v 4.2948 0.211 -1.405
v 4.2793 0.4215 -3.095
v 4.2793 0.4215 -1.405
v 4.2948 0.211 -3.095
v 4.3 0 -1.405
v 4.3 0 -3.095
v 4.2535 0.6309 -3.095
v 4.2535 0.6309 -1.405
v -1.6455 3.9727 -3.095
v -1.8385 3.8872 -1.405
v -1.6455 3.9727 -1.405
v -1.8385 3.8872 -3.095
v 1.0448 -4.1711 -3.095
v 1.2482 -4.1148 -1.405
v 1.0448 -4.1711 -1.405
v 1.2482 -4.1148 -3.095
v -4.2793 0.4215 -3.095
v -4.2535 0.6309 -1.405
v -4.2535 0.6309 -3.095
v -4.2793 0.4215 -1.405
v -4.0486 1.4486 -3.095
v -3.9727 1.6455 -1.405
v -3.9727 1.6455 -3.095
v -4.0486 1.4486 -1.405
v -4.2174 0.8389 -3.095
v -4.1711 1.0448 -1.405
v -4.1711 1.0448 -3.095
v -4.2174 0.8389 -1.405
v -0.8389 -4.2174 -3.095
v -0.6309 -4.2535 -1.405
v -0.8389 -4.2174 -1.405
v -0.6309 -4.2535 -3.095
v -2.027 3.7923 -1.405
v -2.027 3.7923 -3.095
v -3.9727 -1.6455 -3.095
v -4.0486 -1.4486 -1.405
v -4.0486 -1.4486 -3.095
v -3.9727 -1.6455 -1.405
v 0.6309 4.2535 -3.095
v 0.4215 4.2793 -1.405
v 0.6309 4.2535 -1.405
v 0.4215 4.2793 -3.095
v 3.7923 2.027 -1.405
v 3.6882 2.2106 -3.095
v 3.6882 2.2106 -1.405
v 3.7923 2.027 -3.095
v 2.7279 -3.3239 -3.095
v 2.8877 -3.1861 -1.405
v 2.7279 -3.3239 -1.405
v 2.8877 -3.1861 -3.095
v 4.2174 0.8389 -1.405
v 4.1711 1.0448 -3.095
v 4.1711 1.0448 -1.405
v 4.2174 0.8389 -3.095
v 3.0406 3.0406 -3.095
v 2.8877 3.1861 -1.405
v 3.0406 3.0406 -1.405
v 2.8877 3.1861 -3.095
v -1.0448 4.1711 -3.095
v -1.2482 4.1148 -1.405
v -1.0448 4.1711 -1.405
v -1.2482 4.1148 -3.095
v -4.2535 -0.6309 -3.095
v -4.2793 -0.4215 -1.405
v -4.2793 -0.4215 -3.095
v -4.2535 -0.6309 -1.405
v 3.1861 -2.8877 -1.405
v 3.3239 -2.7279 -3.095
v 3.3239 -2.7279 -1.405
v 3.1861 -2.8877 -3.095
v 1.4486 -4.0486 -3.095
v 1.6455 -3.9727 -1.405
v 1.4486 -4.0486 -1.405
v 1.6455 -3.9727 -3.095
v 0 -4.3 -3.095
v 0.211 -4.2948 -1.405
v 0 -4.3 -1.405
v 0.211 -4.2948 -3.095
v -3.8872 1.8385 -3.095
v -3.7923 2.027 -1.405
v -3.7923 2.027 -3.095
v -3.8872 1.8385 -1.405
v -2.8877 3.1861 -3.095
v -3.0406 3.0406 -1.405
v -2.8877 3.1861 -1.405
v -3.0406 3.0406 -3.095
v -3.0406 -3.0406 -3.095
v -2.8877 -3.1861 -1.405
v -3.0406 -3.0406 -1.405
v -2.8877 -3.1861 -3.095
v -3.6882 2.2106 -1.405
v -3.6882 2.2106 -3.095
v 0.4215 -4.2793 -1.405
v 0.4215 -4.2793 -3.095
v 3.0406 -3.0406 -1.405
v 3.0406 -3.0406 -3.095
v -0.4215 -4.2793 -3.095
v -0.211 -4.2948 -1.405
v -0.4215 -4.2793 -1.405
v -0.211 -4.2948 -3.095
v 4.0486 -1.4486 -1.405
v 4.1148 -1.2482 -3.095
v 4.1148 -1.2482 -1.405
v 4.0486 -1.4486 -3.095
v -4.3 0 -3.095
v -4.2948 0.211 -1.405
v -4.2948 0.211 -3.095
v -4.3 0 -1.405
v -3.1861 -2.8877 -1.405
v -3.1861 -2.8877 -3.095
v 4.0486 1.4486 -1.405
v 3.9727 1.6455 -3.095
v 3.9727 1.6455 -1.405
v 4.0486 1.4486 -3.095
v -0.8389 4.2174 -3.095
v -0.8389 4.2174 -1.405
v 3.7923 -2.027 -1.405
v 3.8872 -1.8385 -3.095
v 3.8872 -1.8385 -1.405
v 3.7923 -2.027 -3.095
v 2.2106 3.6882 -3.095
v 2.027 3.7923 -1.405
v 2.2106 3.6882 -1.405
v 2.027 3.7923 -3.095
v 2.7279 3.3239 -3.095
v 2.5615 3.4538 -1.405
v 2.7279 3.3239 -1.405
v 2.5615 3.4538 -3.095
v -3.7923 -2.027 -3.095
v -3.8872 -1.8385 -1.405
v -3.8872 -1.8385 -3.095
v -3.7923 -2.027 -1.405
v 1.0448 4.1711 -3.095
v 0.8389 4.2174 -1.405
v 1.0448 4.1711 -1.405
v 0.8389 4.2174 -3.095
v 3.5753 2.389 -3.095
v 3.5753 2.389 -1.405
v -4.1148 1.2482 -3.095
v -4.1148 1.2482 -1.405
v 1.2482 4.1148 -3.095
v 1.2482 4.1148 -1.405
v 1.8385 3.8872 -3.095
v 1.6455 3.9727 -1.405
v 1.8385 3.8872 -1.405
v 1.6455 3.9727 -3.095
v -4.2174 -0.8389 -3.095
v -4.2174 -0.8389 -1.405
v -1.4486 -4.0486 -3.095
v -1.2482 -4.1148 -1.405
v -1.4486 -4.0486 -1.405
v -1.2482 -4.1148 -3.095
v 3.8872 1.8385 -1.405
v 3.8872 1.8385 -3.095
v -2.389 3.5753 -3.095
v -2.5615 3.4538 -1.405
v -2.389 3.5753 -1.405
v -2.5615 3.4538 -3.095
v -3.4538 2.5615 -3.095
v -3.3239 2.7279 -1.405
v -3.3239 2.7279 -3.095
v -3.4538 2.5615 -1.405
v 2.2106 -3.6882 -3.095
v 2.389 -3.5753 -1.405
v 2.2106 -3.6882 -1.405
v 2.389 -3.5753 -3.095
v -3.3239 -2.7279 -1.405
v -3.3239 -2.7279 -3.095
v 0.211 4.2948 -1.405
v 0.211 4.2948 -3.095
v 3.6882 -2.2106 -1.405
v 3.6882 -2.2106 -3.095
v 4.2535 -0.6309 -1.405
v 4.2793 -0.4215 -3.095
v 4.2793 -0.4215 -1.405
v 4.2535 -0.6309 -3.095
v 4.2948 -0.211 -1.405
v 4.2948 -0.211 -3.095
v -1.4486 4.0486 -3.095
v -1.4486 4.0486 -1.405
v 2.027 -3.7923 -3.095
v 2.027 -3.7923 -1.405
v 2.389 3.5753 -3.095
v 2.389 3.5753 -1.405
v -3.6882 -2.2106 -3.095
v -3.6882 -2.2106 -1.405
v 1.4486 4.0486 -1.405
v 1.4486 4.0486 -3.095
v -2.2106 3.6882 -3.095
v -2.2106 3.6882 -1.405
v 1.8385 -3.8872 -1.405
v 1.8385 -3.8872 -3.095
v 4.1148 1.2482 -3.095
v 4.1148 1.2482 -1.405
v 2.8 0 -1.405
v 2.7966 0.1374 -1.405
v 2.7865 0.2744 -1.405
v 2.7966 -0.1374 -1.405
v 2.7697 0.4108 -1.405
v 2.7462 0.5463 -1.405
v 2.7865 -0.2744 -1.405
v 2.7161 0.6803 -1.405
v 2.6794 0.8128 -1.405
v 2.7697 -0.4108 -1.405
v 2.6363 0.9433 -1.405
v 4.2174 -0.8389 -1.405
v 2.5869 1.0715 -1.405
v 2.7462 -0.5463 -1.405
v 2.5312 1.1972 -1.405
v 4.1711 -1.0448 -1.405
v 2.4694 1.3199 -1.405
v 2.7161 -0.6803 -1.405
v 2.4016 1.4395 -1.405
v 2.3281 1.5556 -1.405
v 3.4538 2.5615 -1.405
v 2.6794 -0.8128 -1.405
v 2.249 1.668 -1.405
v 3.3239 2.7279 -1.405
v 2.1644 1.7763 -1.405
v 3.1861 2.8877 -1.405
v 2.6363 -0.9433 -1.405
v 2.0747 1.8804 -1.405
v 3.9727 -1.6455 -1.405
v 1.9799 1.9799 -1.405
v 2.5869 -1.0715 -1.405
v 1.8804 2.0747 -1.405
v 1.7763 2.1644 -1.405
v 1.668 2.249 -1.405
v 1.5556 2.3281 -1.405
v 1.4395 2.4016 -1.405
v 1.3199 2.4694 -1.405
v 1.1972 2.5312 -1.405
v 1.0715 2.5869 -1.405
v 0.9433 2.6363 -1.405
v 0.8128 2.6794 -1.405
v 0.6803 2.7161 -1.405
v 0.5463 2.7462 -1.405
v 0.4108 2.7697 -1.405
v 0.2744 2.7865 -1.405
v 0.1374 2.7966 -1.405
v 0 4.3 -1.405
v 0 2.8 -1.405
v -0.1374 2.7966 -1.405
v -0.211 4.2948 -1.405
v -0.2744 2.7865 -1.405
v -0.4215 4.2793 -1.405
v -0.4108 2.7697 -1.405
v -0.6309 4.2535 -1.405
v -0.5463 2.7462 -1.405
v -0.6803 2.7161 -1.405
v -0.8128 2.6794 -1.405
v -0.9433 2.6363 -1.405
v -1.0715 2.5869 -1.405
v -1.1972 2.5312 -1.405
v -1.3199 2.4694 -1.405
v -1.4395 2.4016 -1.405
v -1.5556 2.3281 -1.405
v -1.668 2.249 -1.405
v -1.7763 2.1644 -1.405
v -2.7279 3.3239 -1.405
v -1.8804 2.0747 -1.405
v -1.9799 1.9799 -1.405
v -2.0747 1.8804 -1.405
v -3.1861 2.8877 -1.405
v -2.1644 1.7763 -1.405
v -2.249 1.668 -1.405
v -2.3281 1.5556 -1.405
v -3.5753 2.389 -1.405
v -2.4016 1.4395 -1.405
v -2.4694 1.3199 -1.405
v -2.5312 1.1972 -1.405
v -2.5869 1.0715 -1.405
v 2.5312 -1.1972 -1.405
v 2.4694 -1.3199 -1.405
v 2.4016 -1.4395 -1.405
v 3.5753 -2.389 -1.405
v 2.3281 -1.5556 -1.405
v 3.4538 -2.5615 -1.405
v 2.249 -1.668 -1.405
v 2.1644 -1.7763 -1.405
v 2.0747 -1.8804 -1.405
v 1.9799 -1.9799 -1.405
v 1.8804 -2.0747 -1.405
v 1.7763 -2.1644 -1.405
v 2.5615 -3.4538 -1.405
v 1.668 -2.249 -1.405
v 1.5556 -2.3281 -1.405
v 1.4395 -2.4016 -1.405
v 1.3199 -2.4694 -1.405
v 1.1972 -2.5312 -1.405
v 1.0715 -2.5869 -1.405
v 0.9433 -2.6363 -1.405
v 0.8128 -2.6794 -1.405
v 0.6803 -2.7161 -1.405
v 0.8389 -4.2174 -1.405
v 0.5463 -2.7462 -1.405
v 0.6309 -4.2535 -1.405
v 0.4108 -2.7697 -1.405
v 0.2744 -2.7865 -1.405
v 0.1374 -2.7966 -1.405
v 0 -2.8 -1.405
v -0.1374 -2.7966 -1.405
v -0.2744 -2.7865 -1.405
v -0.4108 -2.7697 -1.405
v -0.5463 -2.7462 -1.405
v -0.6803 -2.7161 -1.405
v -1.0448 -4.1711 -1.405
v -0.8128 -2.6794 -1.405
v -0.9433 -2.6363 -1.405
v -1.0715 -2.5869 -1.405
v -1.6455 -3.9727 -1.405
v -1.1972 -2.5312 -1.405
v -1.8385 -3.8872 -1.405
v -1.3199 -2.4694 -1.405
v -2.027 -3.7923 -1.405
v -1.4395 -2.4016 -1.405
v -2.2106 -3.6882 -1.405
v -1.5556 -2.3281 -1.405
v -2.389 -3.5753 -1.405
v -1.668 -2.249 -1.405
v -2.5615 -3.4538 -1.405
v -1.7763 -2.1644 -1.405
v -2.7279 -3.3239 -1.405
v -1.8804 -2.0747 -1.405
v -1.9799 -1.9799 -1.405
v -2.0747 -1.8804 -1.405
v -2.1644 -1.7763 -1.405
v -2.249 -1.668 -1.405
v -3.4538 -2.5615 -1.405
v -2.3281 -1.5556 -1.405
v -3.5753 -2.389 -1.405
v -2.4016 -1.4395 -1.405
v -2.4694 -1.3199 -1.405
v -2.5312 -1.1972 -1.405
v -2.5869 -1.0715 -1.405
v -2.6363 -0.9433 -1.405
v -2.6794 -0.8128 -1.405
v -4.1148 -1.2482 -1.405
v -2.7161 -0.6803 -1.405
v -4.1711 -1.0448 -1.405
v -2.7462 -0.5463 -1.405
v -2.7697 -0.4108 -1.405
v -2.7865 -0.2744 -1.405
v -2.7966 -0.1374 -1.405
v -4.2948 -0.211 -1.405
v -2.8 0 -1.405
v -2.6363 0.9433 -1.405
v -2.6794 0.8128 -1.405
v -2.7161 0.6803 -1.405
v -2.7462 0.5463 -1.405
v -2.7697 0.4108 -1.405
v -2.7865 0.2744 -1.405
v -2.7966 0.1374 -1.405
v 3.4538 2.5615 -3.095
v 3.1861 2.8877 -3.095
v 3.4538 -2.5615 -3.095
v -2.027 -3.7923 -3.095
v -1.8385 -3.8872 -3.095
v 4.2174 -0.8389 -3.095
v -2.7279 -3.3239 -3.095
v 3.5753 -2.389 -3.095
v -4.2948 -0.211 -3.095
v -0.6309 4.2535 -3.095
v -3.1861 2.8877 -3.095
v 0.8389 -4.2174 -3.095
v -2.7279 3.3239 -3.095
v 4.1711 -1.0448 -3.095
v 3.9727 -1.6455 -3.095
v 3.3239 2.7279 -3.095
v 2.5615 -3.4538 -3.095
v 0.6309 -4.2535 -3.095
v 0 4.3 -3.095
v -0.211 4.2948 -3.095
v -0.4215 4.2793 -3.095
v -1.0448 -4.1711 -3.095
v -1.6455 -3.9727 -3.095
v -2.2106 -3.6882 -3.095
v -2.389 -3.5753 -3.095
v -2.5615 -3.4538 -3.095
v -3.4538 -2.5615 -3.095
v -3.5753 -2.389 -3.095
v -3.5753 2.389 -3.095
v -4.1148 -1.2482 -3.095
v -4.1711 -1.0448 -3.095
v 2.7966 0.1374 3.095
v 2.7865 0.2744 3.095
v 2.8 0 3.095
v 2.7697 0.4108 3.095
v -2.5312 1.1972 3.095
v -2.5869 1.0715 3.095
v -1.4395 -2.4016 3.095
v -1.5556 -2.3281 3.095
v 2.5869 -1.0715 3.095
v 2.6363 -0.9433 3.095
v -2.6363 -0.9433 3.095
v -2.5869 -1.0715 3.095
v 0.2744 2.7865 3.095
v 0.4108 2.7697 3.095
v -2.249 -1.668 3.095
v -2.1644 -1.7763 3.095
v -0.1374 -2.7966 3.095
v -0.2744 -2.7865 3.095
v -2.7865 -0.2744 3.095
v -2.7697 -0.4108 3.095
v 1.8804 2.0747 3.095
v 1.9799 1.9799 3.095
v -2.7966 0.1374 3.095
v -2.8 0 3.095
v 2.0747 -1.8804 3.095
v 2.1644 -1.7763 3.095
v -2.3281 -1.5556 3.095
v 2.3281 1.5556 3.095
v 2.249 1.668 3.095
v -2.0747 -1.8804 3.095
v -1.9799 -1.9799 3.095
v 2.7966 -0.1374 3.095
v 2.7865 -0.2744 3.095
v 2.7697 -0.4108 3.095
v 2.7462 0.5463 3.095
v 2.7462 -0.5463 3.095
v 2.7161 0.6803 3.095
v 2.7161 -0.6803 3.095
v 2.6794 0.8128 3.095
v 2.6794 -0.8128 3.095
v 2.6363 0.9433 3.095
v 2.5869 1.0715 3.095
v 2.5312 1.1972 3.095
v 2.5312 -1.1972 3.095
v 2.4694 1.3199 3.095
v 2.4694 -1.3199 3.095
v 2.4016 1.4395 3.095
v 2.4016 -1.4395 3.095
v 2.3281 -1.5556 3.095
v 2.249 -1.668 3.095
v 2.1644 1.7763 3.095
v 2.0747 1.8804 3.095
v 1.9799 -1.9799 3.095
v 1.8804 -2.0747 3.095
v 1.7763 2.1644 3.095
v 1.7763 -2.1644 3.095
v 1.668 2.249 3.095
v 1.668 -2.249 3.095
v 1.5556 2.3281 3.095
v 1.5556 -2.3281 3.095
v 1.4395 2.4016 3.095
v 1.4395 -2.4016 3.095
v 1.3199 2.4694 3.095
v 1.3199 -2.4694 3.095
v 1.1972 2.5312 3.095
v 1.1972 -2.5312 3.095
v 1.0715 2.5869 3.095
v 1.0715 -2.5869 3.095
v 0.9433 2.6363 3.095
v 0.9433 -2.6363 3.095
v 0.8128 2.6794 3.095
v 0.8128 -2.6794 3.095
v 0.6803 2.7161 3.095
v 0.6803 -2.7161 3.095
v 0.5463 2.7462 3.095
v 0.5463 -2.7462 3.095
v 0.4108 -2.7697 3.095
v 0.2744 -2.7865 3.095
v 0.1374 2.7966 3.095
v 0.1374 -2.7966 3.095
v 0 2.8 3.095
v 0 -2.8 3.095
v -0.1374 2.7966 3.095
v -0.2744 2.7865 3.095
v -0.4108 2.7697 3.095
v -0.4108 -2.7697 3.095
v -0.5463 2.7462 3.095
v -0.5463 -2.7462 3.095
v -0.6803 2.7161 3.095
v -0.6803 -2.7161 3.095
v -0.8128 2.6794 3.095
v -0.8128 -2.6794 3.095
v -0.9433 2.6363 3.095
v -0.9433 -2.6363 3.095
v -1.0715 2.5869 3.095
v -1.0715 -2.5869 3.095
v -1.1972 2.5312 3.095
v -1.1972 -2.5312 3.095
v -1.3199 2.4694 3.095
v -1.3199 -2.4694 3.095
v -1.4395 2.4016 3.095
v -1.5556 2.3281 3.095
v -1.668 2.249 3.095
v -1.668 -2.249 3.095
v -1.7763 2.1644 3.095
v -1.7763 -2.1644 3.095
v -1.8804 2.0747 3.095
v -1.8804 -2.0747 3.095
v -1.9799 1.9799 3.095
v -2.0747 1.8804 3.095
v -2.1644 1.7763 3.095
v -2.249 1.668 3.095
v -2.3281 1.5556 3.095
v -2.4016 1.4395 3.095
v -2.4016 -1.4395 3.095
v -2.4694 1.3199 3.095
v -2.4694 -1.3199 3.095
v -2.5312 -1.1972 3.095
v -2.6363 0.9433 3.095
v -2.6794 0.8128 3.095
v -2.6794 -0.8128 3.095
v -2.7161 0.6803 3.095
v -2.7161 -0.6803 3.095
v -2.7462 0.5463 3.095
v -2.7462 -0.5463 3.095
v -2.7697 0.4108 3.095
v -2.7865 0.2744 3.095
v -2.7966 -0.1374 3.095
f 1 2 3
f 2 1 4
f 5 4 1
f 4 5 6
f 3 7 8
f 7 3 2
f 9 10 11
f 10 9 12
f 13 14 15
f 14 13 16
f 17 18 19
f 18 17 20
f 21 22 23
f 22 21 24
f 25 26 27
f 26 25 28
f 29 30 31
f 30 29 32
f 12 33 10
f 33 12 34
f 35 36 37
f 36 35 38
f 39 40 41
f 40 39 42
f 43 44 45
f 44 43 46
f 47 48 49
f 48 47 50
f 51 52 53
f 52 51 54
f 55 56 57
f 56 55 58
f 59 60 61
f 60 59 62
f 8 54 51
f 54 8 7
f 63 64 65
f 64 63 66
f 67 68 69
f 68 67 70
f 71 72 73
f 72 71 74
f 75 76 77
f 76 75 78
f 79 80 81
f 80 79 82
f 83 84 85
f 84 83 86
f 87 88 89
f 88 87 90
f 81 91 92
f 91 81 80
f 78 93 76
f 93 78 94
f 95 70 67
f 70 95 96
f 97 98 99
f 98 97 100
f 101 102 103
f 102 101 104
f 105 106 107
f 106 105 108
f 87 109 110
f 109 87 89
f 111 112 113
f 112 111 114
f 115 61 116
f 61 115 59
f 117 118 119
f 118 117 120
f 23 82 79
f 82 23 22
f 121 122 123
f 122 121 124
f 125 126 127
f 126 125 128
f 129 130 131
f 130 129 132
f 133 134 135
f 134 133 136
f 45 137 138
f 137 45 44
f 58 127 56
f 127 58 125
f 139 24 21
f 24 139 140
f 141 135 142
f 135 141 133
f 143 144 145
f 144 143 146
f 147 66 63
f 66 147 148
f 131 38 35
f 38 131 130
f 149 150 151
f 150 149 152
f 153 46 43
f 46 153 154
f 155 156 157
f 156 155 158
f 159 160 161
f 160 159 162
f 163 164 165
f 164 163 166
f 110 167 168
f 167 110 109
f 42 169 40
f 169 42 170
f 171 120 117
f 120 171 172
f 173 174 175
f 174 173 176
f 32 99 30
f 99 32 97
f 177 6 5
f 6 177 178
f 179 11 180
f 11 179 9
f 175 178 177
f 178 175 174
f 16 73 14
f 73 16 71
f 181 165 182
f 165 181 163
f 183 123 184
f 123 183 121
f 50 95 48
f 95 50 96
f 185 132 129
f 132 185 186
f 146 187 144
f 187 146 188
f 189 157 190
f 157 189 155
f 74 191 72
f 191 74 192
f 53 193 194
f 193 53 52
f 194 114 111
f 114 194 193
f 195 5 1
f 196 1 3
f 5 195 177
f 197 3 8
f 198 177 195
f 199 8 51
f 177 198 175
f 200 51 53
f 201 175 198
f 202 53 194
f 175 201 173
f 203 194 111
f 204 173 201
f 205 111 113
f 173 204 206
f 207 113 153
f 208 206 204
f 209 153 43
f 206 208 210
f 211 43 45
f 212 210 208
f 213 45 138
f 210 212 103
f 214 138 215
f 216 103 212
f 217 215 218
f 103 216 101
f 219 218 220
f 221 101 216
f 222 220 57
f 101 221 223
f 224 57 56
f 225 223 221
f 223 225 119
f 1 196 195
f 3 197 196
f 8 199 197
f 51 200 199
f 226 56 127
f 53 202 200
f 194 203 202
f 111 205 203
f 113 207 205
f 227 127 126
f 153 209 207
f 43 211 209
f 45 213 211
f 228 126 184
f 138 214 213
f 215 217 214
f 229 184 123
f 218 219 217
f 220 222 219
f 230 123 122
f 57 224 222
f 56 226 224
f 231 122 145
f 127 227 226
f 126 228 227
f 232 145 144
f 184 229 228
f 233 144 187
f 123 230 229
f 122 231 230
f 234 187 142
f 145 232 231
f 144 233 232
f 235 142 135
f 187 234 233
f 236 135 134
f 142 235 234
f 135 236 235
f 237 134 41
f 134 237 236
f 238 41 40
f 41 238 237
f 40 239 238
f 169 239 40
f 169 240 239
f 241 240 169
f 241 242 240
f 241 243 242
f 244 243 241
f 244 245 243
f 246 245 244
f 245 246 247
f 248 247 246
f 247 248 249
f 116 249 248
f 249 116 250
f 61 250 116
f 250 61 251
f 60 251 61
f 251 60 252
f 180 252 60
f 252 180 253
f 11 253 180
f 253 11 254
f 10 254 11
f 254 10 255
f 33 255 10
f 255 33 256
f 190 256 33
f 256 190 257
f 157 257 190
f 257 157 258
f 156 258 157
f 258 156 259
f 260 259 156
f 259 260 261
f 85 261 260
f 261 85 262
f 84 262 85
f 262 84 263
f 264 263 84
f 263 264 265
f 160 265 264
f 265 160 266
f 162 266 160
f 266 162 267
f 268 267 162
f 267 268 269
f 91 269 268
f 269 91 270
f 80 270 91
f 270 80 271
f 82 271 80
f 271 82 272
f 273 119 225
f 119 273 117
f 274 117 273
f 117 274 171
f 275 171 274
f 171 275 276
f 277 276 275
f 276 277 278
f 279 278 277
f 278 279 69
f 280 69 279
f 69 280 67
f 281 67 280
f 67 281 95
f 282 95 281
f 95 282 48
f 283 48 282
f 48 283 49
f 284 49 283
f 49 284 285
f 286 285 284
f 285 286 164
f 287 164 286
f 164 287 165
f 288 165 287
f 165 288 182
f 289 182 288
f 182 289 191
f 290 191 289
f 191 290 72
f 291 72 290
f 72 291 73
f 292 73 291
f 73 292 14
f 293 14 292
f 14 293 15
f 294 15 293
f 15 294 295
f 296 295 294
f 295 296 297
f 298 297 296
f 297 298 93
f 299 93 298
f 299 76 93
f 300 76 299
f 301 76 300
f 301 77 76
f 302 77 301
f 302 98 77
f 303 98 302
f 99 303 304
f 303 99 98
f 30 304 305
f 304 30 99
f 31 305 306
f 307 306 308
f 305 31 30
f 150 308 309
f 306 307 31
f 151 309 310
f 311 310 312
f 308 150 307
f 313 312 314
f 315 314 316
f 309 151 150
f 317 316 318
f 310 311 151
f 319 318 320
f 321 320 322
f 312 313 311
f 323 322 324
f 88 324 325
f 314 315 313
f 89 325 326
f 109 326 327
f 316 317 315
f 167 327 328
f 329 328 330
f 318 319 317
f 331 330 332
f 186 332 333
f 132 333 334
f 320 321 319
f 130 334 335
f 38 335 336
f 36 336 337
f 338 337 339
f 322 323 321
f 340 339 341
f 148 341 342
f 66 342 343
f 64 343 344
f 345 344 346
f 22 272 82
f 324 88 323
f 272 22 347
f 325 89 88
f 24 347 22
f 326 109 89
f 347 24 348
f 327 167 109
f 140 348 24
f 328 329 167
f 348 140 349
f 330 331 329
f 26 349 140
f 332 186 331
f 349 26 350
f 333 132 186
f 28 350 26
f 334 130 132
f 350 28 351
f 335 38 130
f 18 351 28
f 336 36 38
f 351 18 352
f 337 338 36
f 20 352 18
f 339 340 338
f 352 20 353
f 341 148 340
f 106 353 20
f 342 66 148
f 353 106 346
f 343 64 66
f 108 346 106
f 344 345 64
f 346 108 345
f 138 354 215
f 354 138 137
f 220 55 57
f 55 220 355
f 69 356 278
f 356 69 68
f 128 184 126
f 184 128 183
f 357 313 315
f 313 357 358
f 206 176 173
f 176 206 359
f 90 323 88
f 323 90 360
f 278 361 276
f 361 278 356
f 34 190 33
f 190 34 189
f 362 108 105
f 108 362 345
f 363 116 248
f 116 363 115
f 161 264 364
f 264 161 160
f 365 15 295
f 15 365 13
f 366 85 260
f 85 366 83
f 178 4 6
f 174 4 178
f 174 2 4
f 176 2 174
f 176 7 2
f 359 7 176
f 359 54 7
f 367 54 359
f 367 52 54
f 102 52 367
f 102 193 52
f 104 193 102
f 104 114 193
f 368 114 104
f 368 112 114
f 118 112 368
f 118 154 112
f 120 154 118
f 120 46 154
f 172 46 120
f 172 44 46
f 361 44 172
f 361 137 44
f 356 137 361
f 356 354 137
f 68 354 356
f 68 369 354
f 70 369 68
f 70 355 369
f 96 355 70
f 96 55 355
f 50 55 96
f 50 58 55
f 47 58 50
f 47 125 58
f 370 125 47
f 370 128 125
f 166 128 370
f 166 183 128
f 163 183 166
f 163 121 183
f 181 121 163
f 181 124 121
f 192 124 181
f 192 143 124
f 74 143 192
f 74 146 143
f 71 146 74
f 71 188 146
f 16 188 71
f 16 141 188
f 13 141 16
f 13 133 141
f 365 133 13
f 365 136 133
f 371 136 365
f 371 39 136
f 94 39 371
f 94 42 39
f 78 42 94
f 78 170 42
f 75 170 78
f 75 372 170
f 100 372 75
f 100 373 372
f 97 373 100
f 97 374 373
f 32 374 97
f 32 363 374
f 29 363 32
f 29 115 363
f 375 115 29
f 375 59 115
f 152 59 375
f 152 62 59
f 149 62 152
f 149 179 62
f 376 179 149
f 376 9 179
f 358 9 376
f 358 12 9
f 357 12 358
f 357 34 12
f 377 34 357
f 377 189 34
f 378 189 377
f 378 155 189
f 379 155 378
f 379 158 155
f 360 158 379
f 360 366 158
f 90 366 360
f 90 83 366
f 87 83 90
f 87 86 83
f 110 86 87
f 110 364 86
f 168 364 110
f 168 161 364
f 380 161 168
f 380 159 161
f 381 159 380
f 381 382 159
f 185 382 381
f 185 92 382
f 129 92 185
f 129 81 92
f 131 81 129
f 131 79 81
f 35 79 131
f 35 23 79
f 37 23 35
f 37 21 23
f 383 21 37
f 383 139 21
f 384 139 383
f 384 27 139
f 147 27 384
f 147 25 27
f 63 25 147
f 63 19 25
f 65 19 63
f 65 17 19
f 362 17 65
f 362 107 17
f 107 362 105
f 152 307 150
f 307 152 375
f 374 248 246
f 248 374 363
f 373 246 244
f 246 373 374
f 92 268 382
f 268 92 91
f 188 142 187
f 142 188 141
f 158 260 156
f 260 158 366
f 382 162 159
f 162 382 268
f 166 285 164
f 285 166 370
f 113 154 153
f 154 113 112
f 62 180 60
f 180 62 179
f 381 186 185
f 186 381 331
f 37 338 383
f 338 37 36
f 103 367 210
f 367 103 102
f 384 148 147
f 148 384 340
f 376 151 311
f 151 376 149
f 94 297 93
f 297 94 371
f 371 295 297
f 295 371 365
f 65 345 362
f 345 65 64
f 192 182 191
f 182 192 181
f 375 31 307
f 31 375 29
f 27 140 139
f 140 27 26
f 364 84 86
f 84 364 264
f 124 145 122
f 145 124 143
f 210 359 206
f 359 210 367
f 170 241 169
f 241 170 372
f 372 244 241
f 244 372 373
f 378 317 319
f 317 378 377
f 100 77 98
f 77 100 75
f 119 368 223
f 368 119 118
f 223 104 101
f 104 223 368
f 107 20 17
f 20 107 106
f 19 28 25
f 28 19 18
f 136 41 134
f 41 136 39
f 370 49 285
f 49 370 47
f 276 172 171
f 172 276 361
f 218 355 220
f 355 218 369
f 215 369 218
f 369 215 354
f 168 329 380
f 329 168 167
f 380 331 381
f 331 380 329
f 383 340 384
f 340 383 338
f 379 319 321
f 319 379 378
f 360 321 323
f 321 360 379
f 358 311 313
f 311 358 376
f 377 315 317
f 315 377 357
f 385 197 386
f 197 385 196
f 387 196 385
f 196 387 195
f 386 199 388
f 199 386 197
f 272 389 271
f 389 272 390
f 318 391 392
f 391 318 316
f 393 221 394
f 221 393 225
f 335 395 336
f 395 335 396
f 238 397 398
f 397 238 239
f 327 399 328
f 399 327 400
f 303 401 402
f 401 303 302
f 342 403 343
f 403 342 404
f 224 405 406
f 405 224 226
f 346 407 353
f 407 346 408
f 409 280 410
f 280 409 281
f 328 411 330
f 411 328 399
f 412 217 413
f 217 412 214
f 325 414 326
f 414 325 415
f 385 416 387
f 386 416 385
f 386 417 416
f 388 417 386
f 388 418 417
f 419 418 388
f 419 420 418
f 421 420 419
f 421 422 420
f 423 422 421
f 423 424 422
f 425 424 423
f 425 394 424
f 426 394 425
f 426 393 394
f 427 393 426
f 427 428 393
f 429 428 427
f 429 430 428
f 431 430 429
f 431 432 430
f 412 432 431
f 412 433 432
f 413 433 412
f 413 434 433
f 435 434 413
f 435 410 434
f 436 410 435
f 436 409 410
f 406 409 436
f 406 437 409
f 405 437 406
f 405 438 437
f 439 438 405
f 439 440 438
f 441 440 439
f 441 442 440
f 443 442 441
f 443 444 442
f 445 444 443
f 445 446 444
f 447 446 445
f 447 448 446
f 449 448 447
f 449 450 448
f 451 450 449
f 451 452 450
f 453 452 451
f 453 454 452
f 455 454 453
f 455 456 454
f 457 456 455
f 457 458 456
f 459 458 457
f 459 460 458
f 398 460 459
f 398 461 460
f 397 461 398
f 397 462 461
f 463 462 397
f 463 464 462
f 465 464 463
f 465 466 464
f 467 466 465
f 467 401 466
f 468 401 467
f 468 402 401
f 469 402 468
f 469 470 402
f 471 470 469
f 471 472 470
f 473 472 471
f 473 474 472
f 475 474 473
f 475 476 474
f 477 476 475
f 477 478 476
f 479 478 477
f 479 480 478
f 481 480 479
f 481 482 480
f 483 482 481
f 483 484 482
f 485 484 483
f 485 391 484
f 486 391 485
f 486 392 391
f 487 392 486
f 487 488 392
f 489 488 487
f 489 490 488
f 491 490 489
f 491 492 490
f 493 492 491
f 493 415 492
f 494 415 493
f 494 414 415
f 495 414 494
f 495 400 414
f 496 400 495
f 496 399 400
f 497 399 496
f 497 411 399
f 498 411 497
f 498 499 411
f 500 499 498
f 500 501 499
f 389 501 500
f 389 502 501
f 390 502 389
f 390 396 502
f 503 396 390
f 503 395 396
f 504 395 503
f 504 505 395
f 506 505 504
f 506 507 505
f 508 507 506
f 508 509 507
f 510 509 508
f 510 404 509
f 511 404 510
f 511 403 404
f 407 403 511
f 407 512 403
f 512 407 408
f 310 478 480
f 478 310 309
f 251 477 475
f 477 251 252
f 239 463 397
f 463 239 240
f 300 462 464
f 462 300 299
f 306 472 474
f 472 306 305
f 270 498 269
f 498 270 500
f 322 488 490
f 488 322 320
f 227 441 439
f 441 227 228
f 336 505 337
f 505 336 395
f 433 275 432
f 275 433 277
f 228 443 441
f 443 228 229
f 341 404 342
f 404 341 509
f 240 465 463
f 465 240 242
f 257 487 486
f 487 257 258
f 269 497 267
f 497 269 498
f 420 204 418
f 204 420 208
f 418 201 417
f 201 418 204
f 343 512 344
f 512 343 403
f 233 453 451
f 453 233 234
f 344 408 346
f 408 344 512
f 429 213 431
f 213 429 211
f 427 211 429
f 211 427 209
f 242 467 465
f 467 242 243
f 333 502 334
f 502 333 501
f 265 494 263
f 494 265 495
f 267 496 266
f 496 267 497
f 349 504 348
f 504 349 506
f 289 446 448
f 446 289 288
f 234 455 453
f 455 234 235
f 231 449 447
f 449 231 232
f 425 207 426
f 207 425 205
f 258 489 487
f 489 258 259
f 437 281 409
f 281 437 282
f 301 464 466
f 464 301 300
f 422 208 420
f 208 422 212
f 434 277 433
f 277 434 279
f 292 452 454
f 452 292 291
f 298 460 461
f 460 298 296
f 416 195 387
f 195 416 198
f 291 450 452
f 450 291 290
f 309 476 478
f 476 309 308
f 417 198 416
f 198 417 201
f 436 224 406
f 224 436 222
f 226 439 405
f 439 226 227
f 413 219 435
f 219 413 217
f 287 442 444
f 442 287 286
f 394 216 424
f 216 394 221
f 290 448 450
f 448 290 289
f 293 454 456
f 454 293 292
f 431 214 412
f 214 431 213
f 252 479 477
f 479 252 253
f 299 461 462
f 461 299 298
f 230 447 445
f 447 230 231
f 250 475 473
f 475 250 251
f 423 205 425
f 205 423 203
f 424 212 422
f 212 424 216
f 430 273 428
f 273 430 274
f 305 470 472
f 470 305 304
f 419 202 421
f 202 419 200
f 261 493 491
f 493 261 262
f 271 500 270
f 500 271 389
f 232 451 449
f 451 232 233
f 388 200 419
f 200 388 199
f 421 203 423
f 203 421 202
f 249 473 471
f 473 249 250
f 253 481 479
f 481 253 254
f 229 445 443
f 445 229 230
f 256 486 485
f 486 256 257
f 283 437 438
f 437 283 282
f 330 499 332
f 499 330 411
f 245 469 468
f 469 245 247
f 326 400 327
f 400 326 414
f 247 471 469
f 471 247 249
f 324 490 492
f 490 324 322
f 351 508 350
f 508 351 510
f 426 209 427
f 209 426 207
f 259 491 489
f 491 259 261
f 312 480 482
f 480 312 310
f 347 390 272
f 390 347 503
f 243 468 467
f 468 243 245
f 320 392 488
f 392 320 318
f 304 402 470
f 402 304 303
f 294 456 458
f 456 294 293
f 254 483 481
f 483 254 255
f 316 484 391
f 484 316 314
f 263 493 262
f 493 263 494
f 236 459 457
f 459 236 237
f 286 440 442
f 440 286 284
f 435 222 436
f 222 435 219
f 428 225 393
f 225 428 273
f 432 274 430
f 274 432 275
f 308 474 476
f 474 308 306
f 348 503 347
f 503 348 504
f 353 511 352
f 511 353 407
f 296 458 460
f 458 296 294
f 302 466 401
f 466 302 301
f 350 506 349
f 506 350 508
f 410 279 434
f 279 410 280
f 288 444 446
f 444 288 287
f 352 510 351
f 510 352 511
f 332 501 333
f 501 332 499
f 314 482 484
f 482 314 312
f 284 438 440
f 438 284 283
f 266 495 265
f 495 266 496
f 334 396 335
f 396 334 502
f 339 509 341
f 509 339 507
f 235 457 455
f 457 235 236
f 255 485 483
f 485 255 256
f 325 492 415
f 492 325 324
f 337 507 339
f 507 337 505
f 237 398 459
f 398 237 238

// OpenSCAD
// Stepped axisymmetric flanged hub (no holes/cutouts), sized to 8.6 x 8.6 x 6.2 mm

// Parameters
OD_flange = 8.6;   //[4.3:17.2:0.01]
H_total   = 6.19;  //[3.095:12.38:0.01]
OD_boss   = 5.6;   //[2.8:11.2:0.01]
H_boss    = 4.5;   //[2.25:9:0.01]
H_flange  = 1.69;  //[0.845:3.38:0.01]

// Quality
$fn = 128;

// Derived (ensure exact connectivity and total height)
H_flange_eff = H_total - H_boss;  // keeps overall height = H_total

module flange_disk() {
    // Flange at bottom, boss on top; model centered about Z=0
    translate([0, 0, -H_total/2 + H_flange_eff/2])
        cylinder(h=H_flange_eff, r=OD_flange/2, center=true);
}

module boss_cylinder() {
    translate([0, 0,  H_total/2 - H_boss/2])
        cylinder(h=H_boss, r=OD_boss/2, center=true);
}

union() {
    flange_disk();
    boss_cylinder();
}
